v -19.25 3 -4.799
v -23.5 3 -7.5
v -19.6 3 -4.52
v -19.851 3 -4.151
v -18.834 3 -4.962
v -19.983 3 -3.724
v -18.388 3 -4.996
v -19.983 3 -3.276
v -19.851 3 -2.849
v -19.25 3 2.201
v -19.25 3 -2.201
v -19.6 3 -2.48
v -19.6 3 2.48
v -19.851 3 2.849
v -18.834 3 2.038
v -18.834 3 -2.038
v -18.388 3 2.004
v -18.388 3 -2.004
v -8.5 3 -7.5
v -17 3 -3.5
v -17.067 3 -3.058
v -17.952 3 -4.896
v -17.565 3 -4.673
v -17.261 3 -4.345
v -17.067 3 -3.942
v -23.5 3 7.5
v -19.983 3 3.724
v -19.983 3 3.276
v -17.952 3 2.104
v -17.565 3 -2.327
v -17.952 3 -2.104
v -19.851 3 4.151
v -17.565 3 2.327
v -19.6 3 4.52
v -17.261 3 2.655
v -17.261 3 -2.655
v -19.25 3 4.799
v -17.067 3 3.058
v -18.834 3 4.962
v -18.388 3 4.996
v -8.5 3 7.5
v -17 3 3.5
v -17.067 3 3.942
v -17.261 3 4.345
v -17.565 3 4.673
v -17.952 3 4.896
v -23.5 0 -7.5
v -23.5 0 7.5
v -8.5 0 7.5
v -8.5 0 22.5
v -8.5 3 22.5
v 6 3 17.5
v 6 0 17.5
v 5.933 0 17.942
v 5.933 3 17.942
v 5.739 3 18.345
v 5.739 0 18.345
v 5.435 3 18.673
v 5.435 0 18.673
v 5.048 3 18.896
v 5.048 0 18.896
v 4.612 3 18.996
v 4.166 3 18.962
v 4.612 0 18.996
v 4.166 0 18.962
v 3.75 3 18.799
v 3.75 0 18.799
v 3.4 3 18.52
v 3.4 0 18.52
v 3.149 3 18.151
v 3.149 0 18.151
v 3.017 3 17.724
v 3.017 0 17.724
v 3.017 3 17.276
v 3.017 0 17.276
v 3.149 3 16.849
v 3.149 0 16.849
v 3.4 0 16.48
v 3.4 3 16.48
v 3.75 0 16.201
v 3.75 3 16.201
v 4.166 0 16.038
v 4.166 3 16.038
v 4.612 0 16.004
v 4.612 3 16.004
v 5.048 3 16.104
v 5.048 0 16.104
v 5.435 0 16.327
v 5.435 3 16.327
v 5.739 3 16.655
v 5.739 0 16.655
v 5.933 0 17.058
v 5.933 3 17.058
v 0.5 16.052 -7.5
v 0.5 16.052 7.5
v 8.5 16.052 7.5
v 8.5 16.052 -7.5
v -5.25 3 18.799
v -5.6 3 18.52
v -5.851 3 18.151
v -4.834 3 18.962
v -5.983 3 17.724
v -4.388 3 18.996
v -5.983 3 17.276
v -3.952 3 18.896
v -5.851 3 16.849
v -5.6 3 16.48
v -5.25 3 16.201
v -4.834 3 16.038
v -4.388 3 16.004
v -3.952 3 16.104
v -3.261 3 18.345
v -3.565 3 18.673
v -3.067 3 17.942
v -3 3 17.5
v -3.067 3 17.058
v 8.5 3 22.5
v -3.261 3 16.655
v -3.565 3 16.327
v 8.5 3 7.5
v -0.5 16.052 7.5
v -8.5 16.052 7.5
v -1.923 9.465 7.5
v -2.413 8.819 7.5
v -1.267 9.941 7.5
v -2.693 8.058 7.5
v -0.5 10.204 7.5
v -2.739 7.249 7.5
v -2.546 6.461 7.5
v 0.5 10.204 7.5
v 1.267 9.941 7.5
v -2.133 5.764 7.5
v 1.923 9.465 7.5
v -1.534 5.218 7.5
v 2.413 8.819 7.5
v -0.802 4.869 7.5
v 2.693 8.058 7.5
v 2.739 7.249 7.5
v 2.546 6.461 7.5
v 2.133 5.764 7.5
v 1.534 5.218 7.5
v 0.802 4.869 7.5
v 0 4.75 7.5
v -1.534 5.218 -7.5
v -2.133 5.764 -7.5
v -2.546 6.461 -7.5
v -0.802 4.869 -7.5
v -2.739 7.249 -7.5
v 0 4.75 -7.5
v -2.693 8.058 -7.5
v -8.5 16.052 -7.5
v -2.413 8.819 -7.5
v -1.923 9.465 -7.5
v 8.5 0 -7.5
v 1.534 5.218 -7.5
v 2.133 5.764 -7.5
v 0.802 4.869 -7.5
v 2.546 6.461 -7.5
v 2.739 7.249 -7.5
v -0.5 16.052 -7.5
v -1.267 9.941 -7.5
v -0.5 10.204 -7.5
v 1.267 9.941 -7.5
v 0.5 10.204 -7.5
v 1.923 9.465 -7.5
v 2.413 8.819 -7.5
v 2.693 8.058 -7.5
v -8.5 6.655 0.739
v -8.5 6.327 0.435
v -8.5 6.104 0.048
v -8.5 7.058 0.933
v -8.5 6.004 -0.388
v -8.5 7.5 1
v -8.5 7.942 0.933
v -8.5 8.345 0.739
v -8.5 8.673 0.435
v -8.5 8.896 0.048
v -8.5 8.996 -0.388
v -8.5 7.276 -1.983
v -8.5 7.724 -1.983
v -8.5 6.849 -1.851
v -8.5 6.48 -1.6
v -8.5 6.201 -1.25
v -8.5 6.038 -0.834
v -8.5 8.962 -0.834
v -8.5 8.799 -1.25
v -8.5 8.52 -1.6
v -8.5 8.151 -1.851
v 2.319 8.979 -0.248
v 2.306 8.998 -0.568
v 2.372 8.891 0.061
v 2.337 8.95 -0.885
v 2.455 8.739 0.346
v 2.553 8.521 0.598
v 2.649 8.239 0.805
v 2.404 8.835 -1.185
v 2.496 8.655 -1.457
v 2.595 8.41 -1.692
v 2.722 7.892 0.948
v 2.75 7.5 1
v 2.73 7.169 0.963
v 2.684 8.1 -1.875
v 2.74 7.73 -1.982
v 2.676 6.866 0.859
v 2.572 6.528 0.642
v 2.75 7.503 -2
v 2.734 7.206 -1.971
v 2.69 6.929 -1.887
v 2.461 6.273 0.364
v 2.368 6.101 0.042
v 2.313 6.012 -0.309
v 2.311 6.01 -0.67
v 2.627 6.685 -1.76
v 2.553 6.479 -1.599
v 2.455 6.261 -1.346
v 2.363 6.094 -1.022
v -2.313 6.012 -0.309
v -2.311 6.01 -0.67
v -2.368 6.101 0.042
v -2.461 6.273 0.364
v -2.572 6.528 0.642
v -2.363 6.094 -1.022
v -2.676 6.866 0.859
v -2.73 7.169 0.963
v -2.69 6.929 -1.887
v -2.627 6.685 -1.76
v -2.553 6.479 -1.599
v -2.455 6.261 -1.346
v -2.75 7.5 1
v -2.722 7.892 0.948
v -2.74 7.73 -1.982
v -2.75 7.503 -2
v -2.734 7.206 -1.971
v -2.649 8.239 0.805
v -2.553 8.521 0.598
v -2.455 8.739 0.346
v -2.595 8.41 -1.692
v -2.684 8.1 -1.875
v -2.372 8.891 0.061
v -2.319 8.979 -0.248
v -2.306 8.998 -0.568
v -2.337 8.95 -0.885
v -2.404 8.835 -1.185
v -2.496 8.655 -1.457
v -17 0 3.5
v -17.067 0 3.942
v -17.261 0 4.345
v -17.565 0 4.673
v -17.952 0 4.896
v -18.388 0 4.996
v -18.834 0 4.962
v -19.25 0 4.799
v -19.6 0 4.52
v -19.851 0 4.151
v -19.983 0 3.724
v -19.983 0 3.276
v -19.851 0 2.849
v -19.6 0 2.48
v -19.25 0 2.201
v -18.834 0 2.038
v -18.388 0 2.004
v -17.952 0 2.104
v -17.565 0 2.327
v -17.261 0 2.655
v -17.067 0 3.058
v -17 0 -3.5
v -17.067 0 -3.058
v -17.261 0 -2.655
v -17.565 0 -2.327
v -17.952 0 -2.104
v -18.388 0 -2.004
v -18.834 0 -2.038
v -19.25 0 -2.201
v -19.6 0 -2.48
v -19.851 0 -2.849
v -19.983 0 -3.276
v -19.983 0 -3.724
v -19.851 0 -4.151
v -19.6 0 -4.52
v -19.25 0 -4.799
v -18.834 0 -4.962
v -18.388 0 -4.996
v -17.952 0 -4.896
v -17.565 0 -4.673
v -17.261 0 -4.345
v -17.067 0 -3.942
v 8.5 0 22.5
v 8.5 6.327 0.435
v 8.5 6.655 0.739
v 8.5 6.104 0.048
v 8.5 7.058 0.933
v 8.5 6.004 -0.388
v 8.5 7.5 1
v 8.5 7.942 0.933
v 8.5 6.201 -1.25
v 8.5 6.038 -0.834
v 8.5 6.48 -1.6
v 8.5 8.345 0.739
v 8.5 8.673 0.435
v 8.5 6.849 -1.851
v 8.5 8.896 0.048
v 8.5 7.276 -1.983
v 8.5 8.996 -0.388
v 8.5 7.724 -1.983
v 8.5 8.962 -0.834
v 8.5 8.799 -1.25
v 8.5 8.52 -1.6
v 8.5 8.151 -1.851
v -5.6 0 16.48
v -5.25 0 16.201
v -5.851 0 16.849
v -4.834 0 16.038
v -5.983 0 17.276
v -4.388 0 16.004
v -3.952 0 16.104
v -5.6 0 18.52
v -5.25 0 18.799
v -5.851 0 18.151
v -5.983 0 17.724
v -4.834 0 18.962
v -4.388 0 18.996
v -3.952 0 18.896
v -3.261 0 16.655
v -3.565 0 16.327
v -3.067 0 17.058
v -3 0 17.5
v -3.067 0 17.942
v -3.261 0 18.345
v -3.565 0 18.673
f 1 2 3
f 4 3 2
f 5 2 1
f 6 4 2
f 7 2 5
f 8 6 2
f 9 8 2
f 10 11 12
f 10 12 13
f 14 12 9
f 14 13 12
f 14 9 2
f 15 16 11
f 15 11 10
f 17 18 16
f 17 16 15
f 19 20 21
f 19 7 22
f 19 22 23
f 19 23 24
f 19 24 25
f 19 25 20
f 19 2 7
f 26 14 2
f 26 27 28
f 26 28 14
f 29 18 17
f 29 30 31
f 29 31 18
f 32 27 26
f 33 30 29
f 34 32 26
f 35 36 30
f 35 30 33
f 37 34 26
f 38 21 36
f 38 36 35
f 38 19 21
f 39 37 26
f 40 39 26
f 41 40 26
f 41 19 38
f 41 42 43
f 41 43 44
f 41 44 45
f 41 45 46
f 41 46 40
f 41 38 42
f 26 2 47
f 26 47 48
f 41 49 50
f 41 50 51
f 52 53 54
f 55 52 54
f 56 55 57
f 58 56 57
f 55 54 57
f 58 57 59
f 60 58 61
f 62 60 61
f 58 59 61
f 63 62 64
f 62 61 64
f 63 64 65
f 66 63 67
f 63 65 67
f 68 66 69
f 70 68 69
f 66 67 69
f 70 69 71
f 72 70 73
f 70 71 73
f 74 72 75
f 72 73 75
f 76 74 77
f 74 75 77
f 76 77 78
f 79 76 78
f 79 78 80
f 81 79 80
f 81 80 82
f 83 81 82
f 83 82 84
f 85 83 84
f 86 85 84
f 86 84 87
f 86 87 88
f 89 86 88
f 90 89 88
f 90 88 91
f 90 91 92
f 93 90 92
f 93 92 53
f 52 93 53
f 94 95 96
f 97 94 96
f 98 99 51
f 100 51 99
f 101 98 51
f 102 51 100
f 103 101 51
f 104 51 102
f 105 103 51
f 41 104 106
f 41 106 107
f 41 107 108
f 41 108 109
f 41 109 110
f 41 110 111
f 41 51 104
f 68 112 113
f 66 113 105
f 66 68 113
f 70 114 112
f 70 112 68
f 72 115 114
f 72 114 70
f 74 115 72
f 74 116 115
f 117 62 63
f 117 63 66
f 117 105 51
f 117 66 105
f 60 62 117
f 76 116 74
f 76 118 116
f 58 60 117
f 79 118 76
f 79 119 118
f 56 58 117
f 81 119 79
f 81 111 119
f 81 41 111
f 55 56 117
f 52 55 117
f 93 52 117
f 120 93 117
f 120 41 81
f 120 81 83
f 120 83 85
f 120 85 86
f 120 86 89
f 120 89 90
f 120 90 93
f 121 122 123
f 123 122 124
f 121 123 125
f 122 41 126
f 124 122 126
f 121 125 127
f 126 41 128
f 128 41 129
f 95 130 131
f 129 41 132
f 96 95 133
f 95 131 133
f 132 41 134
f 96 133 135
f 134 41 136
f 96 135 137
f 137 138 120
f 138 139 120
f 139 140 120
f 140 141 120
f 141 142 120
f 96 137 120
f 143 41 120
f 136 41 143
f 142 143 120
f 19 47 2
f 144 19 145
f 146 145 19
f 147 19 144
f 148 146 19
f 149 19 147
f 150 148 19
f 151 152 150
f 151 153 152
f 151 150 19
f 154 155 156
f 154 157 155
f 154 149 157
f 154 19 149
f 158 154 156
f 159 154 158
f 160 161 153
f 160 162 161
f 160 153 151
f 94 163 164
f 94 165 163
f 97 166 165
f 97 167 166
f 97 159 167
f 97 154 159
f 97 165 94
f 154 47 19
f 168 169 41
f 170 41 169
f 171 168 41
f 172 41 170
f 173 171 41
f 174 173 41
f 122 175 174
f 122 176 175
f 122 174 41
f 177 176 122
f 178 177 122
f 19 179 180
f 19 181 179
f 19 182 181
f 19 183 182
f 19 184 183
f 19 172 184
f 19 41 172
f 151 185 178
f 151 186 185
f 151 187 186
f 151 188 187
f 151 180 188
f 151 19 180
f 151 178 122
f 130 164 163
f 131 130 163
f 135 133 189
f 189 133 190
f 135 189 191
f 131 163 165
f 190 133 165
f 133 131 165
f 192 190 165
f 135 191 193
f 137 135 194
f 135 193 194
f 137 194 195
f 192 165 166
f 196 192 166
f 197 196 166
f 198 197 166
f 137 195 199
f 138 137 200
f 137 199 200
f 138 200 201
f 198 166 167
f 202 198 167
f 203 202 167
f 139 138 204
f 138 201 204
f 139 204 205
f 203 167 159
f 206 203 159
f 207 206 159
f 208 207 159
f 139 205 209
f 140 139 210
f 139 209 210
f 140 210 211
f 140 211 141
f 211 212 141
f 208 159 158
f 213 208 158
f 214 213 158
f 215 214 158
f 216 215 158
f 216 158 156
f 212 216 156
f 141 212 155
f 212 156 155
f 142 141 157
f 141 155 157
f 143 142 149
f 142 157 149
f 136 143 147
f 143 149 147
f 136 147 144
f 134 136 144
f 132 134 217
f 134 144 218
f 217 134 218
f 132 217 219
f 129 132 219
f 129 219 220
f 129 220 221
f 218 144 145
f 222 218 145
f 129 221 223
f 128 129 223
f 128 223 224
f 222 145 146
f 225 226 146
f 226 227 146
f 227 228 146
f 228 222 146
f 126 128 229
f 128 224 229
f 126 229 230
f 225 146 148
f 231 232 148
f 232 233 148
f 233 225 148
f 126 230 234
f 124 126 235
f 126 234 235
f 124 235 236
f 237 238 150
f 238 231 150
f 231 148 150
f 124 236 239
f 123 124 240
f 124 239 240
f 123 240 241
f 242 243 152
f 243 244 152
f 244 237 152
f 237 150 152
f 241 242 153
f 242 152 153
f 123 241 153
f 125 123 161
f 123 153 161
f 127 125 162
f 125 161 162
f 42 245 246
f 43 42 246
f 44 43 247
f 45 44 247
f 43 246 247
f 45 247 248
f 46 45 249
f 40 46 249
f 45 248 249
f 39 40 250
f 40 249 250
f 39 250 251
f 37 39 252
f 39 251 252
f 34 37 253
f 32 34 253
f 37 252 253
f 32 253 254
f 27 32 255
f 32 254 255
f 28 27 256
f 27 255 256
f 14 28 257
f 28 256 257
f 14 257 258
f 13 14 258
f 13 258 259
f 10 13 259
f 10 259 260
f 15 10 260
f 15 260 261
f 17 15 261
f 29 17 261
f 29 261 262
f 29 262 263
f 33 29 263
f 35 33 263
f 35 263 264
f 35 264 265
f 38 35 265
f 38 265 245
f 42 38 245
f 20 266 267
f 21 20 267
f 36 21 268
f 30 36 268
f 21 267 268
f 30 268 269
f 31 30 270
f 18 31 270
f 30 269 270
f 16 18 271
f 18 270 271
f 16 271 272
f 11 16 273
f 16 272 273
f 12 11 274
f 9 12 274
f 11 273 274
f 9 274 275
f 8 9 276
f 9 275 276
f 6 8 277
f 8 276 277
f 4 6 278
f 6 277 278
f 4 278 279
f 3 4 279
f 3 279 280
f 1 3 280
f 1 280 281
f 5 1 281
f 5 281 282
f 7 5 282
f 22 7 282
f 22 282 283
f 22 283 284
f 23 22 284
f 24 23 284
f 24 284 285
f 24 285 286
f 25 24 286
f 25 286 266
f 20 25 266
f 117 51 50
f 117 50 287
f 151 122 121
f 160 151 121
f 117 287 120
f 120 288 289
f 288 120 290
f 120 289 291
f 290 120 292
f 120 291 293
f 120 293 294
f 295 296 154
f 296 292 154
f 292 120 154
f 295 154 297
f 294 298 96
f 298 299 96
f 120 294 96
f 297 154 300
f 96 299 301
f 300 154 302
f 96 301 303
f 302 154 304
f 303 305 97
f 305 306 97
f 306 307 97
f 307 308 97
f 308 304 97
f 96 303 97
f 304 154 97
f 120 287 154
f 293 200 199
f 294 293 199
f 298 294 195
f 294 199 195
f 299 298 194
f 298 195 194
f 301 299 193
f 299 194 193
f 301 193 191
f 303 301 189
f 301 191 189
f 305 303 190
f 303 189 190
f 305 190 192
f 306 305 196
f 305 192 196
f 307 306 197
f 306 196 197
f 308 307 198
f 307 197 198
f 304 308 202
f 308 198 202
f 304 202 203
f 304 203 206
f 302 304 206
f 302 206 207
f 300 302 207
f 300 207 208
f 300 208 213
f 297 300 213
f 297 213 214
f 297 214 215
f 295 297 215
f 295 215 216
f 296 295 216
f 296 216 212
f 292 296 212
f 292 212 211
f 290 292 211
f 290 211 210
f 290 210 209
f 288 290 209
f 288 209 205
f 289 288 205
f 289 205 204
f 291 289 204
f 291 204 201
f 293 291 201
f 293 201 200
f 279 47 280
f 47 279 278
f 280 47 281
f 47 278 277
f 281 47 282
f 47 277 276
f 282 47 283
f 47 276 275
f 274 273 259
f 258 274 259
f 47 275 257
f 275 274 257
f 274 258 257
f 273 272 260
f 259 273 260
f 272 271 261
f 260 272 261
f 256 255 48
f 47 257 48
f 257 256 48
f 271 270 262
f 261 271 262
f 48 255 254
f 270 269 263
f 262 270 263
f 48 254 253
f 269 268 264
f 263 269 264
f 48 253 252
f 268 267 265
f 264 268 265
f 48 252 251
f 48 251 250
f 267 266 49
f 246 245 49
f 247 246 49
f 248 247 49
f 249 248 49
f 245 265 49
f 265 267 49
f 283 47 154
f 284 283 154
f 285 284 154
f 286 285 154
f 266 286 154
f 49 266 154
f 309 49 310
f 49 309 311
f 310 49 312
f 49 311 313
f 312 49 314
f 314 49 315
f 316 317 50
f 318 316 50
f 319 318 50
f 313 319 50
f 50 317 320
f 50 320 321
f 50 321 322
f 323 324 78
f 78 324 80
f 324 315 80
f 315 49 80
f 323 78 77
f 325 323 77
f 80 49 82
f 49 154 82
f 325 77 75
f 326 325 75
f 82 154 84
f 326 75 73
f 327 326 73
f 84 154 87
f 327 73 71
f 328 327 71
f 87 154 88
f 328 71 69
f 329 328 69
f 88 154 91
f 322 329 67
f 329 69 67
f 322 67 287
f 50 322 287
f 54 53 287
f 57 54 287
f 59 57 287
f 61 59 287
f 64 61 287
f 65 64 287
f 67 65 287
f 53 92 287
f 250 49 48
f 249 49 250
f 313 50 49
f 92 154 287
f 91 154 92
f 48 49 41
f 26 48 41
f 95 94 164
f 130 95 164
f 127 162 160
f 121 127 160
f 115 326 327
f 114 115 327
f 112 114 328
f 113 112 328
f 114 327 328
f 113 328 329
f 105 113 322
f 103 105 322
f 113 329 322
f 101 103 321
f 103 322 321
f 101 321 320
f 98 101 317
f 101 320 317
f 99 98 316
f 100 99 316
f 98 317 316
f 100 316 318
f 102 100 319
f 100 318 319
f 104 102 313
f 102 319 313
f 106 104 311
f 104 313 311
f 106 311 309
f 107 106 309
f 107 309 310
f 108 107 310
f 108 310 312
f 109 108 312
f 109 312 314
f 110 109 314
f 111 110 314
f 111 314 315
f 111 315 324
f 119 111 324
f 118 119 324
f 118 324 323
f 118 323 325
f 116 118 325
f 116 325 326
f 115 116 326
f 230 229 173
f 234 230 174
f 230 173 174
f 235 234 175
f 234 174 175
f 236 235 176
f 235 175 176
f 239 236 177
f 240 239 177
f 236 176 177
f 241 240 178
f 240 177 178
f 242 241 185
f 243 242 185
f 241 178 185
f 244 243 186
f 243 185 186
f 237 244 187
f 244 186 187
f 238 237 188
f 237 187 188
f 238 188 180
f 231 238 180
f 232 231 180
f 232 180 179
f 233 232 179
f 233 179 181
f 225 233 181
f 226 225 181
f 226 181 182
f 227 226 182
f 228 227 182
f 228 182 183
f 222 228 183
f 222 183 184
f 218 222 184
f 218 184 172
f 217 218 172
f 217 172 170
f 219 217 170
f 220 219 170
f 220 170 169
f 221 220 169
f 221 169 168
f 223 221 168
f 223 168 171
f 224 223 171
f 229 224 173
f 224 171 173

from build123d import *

# Parameters (mm, degrees)
CROQUIS1_W              = 17
CROQUIS1_H              = 15
SALIENTE_EXTRUIR1_DEPTH = 20
CROQUIS2_R              = 2.75
CORTAR_EXTRUIR1_DEPTH   = 20
CROQUIS4_R              = 1.5
CORTAR_EXTRUIR3_DEPTH   = 20
CROQUIS7_W              = 8
CROQUIS7_H              = 3.948353597
CORTAR_EXTRUIR5_DEPTH   = 35
CROQUIS8_W              = 17
CROQUIS8_H              = 3
SALIENTE_EXTRUIR2_DEPTH = 15
CROQUIS9_W              = 15
CROQUIS9_H              = 3
SALIENTE_EXTRUIR3_DEPTH = 15
CROQUIS10_R             = 1.5
CORTAR_EXTRUIR6_DEPTH   = 10


with BuildPart() as part:
    # Croquis1 → Saliente-Extruir1 (new body)
    with BuildSketch(Plane(origin=(0, 0, 0), x_dir=(1, 0, 0), z_dir=(0, 1, 0))):
        Rectangle(CROQUIS1_W, CROQUIS1_H)
    extrude(amount=SALIENTE_EXTRUIR1_DEPTH)

    # Croquis2 → Cortar-Extruir1 (cut)
    with BuildSketch(Plane(origin=(0, 0, -7.5), x_dir=(-1, 0, 0), z_dir=(0, 0, -1))):
        with Locations((0, 7.5)):
            Circle(CROQUIS2_R)
        with BuildLine():
            Line((0.5, 20), (-0.5, 20))
            Line((-0.5, 20), (-0.5, 10.204163457))
            ThreePointArc((-0.5, 10.204163457), (0, 10.25), (0.5, 10.204163457))
            Line((0.5, 10.204163457), (0.5, 20))
        make_face()
    extrude(amount=-CORTAR_EXTRUIR1_DEPTH, mode=Mode.SUBTRACT)

    # Croquis4 → Cortar-Extruir3 (cut)
    with BuildSketch(Plane.ZY.offset(8.5)):
        with Locations((-0.5, 7.5)):
            Circle(CROQUIS4_R)
    extrude(amount=-CORTAR_EXTRUIR3_DEPTH, mode=Mode.SUBTRACT)

    # Croquis7 → Cortar-Extruir5 (cut)
    with BuildSketch(Plane.XY.offset(7.5)):
        with Locations((4.5, 18.025823201)):
            Rectangle(CROQUIS7_W, CROQUIS7_H)
        with Locations((-4.5, 18.025823201)):
            Rectangle(CROQUIS7_W, CROQUIS7_H)
    extrude(amount=-CORTAR_EXTRUIR5_DEPTH, mode=Mode.SUBTRACT)

    # Croquis8 → Saliente-Extruir2 (add)
    with BuildSketch(Plane.XY.offset(7.5)):
        with Locations((0, 1.5)):
            Rectangle(CROQUIS8_W, CROQUIS8_H)
    extrude(amount=SALIENTE_EXTRUIR2_DEPTH)

    # Croquis9 → Saliente-Extruir3 (add)
    with BuildSketch(Plane.ZY.offset(8.5)):
        with Locations((0, 1.5)):
            Rectangle(CROQUIS9_W, CROQUIS9_H)
    extrude(amount=SALIENTE_EXTRUIR3_DEPTH)

    # Croquis10 → Cortar-Extruir6 (cut)
    with BuildSketch(Plane.XZ):
        with Locations((-18.5, -3.5)):
            Circle(CROQUIS10_R)
        with Locations((-4.5, 17.5)):
            Circle(CROQUIS10_R)
        with Locations((4.5, 17.5)):
            Circle(CROQUIS10_R)
        with Locations((-18.5, 3.5)):
            Circle(CROQUIS10_R)
    extrude(amount=-CORTAR_EXTRUIR6_DEPTH, mode=Mode.SUBTRACT)


solid = part.part
